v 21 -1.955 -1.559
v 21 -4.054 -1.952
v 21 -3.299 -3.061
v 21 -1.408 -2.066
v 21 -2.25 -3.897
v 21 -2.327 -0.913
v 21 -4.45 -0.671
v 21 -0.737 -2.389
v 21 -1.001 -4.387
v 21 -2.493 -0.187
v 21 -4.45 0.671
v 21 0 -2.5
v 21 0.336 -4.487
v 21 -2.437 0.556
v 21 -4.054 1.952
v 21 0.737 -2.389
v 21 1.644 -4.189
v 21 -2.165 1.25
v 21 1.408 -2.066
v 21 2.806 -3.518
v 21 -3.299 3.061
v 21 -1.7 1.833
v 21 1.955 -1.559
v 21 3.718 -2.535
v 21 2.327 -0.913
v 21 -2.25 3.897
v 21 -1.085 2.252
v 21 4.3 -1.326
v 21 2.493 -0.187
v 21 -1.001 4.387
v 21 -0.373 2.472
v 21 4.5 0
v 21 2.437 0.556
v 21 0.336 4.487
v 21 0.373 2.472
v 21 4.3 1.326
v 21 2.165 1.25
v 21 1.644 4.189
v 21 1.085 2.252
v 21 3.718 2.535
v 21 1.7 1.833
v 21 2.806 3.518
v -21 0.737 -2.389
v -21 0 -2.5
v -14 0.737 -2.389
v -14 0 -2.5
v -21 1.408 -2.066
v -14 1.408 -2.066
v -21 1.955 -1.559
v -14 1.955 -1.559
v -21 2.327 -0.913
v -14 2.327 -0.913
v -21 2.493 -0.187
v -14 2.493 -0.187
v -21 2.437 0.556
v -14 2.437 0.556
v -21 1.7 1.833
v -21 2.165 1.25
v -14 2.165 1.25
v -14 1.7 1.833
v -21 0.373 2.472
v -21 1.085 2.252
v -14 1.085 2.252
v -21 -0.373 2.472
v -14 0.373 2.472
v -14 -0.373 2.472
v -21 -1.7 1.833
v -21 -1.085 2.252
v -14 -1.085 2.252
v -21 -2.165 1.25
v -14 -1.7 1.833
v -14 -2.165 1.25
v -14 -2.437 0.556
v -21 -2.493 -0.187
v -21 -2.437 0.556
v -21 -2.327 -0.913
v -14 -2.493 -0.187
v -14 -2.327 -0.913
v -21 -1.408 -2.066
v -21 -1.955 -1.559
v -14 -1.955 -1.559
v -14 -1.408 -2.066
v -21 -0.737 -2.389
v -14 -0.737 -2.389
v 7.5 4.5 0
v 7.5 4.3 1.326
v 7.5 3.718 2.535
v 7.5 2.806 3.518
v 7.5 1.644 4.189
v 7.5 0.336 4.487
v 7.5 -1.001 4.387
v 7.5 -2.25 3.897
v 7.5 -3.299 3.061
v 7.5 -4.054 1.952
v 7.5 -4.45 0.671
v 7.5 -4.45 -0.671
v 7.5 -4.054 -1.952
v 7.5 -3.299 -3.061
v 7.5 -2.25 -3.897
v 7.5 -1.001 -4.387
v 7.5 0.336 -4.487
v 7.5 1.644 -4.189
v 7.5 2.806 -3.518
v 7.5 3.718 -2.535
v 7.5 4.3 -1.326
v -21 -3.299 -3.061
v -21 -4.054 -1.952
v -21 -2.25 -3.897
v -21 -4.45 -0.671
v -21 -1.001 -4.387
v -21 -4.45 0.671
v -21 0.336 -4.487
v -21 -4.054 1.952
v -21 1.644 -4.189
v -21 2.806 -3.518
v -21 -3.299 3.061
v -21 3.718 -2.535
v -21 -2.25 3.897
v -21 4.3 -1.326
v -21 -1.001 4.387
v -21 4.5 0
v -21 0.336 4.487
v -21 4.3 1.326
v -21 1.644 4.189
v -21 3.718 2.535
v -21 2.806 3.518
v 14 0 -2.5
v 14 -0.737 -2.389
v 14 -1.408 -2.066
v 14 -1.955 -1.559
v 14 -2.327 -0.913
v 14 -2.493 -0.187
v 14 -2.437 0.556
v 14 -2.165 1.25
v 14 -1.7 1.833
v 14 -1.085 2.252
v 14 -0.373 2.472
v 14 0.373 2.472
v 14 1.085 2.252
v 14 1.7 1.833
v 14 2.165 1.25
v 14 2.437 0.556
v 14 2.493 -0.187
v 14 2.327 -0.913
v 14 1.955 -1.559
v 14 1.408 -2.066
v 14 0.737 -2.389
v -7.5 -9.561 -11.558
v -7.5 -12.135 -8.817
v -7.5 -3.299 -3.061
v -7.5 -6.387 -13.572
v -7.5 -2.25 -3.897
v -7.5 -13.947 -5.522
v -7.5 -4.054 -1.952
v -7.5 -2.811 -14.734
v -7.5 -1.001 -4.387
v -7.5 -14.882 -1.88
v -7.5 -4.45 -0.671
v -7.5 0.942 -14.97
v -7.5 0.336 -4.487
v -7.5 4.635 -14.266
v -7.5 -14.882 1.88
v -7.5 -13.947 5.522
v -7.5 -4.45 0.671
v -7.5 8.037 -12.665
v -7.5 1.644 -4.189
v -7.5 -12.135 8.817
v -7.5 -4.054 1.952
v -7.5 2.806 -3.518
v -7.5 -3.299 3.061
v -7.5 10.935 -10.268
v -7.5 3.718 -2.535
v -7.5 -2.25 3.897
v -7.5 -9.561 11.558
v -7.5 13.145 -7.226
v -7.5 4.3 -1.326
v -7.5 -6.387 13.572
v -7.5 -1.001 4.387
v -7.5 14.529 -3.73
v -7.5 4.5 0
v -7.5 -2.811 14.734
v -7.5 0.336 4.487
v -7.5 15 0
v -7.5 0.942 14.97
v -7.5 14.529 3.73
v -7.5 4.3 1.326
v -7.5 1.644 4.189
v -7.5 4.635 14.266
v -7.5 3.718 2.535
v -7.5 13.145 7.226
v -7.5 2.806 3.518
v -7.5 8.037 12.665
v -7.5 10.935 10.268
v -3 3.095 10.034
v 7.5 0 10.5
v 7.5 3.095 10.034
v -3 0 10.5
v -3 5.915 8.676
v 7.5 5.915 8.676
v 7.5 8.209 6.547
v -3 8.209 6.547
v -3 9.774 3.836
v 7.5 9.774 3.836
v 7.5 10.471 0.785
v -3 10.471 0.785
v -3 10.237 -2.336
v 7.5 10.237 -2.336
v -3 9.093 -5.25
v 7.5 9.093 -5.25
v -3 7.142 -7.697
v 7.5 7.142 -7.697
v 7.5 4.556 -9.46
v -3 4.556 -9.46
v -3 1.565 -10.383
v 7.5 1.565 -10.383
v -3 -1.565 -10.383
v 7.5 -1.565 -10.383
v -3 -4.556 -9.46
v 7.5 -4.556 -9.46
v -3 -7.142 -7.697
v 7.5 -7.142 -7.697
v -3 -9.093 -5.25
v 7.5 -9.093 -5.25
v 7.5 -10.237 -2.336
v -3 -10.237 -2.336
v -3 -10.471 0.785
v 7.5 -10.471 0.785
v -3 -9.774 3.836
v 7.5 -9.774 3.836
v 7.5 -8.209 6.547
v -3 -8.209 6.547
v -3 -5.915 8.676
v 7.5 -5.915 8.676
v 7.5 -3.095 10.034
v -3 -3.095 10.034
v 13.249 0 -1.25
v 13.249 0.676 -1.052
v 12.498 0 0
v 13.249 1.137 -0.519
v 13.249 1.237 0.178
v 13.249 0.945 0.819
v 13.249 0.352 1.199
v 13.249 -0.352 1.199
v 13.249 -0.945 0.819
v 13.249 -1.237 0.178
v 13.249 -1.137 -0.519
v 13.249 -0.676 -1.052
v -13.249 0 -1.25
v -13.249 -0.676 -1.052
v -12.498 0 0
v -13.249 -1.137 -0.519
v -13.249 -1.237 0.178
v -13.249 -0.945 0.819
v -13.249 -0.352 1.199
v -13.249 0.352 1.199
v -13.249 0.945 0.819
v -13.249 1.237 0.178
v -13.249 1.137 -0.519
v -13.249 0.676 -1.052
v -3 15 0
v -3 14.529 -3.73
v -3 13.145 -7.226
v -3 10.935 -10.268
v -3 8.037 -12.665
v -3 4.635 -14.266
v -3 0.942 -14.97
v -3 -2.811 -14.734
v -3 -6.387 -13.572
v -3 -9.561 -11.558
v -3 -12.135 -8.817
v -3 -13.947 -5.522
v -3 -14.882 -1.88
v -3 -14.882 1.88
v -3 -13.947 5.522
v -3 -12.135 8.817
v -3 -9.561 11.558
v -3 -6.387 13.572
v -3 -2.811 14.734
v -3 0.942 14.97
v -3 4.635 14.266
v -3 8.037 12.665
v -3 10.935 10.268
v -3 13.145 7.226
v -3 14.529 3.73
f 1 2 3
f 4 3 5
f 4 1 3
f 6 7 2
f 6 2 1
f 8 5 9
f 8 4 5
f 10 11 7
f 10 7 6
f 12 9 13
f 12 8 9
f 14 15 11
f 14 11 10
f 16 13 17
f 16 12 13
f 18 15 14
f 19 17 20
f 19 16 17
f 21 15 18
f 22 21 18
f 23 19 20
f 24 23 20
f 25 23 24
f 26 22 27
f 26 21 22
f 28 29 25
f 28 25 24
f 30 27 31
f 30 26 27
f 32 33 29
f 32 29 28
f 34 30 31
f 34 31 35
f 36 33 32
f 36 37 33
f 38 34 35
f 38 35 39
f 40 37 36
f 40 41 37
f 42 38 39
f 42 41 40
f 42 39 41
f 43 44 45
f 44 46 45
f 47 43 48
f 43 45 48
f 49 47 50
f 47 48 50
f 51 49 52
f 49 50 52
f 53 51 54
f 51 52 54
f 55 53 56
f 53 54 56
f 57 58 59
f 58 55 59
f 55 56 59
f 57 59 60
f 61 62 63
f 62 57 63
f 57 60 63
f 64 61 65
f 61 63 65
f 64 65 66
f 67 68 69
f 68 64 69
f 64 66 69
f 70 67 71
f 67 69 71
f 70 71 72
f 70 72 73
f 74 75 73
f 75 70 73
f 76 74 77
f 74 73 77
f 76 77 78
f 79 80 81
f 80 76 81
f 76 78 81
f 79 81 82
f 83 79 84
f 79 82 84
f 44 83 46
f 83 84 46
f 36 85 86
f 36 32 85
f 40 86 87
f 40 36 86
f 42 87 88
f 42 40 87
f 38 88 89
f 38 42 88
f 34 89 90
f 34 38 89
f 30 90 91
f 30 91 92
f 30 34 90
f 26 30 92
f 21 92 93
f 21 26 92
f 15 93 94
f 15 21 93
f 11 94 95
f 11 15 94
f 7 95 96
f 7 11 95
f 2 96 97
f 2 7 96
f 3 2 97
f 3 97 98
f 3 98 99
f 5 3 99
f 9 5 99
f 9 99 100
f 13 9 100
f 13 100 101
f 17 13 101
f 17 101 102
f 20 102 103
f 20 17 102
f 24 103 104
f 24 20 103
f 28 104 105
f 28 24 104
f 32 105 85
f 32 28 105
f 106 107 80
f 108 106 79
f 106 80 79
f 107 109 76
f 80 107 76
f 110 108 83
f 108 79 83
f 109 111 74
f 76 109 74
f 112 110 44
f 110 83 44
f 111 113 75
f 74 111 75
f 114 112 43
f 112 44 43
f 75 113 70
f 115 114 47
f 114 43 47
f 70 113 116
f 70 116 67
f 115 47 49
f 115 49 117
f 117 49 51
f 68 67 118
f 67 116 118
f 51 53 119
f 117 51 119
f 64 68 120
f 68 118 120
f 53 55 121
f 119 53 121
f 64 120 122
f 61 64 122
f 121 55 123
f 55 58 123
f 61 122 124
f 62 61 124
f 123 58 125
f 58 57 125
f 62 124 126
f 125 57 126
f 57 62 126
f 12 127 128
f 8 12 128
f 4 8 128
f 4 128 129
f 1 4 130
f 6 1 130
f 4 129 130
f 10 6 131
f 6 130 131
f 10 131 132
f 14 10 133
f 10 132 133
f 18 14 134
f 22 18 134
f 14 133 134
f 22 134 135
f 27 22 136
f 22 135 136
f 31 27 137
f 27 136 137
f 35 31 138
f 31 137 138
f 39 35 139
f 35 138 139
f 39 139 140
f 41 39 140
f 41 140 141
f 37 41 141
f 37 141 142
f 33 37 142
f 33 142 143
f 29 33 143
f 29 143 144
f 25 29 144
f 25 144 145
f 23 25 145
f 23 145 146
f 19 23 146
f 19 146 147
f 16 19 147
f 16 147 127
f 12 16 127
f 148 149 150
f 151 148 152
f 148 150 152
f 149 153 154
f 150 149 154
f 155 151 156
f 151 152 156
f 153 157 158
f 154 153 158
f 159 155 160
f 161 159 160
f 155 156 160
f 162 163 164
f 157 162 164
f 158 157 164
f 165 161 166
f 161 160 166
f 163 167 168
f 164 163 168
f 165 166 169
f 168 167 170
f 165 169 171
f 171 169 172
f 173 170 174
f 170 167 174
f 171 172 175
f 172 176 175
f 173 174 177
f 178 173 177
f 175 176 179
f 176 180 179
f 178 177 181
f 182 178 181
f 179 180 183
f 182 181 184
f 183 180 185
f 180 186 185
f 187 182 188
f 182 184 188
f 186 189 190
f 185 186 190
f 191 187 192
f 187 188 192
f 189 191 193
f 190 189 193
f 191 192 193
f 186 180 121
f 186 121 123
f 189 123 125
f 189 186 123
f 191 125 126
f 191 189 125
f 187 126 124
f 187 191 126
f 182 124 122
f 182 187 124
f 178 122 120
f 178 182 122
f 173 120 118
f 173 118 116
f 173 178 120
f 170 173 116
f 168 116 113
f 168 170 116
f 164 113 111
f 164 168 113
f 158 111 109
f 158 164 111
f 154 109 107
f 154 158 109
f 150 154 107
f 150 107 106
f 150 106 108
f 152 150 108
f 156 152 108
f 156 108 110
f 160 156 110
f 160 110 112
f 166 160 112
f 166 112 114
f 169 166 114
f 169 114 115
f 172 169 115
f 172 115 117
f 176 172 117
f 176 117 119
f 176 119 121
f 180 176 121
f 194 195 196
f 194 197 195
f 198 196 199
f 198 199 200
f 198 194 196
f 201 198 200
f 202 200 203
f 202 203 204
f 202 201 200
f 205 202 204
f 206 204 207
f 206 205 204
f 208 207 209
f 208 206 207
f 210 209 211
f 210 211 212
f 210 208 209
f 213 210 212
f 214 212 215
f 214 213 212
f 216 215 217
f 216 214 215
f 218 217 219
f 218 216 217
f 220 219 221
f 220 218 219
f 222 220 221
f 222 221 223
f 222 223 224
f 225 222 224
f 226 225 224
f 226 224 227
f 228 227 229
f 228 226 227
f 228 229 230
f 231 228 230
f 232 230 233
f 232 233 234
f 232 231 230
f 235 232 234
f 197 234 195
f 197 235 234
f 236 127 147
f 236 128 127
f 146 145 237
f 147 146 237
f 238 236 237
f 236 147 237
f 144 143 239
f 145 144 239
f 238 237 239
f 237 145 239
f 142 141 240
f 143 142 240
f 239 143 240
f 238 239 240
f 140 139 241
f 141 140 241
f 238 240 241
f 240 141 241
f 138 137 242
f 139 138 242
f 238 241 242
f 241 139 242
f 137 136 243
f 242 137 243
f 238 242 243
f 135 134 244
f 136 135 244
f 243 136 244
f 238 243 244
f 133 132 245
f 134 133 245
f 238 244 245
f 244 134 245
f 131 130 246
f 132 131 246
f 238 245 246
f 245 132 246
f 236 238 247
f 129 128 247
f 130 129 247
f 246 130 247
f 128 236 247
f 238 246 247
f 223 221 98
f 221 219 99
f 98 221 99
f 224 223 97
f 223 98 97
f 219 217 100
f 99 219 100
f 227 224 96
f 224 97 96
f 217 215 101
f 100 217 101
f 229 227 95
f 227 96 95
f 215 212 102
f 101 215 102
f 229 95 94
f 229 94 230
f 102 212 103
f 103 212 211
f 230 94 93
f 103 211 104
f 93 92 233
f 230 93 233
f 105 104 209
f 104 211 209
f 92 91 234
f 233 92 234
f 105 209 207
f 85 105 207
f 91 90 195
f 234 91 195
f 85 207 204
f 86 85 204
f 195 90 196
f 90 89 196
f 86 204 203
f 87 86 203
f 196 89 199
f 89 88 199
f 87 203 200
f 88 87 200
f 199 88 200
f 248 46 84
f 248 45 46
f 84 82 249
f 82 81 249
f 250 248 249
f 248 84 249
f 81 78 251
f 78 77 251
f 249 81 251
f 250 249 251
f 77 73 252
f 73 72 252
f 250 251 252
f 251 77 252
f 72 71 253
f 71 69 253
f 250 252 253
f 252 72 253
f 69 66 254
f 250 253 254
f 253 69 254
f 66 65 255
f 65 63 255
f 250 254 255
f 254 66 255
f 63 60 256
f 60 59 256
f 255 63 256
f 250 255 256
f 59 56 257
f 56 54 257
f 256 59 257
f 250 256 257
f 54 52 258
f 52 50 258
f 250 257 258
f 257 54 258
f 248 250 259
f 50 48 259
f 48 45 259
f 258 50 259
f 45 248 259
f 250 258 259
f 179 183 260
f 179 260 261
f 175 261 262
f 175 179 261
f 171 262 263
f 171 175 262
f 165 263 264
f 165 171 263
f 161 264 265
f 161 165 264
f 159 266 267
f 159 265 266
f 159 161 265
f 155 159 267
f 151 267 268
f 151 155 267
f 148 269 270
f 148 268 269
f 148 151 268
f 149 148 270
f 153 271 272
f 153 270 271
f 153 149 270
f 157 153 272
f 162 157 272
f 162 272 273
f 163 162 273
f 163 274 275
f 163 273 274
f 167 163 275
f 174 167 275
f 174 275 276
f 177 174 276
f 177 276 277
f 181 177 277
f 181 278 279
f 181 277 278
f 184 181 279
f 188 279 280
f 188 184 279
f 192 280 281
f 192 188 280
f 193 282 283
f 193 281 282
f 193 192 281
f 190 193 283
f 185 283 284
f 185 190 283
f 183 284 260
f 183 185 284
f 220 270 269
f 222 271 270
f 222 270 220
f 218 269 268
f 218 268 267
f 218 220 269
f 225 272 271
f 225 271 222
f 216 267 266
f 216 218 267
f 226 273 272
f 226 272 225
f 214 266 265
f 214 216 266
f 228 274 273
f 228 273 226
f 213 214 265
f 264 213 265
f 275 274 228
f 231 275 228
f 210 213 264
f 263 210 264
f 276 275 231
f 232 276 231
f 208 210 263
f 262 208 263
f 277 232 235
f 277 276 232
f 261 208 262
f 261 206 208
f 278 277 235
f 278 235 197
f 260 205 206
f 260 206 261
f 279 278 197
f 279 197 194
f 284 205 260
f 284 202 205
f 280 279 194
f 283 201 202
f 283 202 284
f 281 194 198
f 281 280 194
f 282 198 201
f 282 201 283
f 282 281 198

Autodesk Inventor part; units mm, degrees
ref_plane "XZ Plane" through (0, 0, 0) normal (0, 1, 0) x (-1, 0, 0)
ref_plane "XY Plane" through (0, 0, 0) normal (0, 0, 1) x (1, 0, 0)
sketch "Sketch1" plane through (0, 0, 0) normal (1, 0, 0) x (0, 1, 0)
  circle A0 centre (0, 0) radius 4.5
  dimension "d0" = 9
extrude "Extrusion1" add sketch "Sketch1" along normal mid plane 42
sketch "Sketch2" plane through (21, 0, 0) normal (1, 0, 0) x (0, 0, -1)
  circle A0 centre (0, 0) radius 4.5 projected
hole "Hole1" at (21, 0, 0) direction (-1, 0, 0) diameter 5 depth 7 tip angle 118
mirror "Mirror1" about plane through (0, 0, 0) normal (1, 0, 0) of "Hole1"
ref_plane "Work Plane2" through (-7.5, 0, 0) normal (1, 0, 0) x (0, 1, 0)
sketch "Sketch3" plane through (-7.5, 0, 0) normal (1, 0, 0) x (0, 1, 0)
  circle A0 centre (0, 0) radius 15
  dimension "d10" = 30
extrude "Extrusion2" add sketch "Sketch3" along normal blind 4.5
sketch "Sketch4" plane through (-7.5, 0, 0) normal (-1, 0, 0) x (0, 0, 1)
  circle A0 centre (0, 0) radius 10.5
  dimension "d13" = 21
extrude "Extrusion3" add sketch "Sketch4" against normal blind 15
properties part number "dfifferential"
